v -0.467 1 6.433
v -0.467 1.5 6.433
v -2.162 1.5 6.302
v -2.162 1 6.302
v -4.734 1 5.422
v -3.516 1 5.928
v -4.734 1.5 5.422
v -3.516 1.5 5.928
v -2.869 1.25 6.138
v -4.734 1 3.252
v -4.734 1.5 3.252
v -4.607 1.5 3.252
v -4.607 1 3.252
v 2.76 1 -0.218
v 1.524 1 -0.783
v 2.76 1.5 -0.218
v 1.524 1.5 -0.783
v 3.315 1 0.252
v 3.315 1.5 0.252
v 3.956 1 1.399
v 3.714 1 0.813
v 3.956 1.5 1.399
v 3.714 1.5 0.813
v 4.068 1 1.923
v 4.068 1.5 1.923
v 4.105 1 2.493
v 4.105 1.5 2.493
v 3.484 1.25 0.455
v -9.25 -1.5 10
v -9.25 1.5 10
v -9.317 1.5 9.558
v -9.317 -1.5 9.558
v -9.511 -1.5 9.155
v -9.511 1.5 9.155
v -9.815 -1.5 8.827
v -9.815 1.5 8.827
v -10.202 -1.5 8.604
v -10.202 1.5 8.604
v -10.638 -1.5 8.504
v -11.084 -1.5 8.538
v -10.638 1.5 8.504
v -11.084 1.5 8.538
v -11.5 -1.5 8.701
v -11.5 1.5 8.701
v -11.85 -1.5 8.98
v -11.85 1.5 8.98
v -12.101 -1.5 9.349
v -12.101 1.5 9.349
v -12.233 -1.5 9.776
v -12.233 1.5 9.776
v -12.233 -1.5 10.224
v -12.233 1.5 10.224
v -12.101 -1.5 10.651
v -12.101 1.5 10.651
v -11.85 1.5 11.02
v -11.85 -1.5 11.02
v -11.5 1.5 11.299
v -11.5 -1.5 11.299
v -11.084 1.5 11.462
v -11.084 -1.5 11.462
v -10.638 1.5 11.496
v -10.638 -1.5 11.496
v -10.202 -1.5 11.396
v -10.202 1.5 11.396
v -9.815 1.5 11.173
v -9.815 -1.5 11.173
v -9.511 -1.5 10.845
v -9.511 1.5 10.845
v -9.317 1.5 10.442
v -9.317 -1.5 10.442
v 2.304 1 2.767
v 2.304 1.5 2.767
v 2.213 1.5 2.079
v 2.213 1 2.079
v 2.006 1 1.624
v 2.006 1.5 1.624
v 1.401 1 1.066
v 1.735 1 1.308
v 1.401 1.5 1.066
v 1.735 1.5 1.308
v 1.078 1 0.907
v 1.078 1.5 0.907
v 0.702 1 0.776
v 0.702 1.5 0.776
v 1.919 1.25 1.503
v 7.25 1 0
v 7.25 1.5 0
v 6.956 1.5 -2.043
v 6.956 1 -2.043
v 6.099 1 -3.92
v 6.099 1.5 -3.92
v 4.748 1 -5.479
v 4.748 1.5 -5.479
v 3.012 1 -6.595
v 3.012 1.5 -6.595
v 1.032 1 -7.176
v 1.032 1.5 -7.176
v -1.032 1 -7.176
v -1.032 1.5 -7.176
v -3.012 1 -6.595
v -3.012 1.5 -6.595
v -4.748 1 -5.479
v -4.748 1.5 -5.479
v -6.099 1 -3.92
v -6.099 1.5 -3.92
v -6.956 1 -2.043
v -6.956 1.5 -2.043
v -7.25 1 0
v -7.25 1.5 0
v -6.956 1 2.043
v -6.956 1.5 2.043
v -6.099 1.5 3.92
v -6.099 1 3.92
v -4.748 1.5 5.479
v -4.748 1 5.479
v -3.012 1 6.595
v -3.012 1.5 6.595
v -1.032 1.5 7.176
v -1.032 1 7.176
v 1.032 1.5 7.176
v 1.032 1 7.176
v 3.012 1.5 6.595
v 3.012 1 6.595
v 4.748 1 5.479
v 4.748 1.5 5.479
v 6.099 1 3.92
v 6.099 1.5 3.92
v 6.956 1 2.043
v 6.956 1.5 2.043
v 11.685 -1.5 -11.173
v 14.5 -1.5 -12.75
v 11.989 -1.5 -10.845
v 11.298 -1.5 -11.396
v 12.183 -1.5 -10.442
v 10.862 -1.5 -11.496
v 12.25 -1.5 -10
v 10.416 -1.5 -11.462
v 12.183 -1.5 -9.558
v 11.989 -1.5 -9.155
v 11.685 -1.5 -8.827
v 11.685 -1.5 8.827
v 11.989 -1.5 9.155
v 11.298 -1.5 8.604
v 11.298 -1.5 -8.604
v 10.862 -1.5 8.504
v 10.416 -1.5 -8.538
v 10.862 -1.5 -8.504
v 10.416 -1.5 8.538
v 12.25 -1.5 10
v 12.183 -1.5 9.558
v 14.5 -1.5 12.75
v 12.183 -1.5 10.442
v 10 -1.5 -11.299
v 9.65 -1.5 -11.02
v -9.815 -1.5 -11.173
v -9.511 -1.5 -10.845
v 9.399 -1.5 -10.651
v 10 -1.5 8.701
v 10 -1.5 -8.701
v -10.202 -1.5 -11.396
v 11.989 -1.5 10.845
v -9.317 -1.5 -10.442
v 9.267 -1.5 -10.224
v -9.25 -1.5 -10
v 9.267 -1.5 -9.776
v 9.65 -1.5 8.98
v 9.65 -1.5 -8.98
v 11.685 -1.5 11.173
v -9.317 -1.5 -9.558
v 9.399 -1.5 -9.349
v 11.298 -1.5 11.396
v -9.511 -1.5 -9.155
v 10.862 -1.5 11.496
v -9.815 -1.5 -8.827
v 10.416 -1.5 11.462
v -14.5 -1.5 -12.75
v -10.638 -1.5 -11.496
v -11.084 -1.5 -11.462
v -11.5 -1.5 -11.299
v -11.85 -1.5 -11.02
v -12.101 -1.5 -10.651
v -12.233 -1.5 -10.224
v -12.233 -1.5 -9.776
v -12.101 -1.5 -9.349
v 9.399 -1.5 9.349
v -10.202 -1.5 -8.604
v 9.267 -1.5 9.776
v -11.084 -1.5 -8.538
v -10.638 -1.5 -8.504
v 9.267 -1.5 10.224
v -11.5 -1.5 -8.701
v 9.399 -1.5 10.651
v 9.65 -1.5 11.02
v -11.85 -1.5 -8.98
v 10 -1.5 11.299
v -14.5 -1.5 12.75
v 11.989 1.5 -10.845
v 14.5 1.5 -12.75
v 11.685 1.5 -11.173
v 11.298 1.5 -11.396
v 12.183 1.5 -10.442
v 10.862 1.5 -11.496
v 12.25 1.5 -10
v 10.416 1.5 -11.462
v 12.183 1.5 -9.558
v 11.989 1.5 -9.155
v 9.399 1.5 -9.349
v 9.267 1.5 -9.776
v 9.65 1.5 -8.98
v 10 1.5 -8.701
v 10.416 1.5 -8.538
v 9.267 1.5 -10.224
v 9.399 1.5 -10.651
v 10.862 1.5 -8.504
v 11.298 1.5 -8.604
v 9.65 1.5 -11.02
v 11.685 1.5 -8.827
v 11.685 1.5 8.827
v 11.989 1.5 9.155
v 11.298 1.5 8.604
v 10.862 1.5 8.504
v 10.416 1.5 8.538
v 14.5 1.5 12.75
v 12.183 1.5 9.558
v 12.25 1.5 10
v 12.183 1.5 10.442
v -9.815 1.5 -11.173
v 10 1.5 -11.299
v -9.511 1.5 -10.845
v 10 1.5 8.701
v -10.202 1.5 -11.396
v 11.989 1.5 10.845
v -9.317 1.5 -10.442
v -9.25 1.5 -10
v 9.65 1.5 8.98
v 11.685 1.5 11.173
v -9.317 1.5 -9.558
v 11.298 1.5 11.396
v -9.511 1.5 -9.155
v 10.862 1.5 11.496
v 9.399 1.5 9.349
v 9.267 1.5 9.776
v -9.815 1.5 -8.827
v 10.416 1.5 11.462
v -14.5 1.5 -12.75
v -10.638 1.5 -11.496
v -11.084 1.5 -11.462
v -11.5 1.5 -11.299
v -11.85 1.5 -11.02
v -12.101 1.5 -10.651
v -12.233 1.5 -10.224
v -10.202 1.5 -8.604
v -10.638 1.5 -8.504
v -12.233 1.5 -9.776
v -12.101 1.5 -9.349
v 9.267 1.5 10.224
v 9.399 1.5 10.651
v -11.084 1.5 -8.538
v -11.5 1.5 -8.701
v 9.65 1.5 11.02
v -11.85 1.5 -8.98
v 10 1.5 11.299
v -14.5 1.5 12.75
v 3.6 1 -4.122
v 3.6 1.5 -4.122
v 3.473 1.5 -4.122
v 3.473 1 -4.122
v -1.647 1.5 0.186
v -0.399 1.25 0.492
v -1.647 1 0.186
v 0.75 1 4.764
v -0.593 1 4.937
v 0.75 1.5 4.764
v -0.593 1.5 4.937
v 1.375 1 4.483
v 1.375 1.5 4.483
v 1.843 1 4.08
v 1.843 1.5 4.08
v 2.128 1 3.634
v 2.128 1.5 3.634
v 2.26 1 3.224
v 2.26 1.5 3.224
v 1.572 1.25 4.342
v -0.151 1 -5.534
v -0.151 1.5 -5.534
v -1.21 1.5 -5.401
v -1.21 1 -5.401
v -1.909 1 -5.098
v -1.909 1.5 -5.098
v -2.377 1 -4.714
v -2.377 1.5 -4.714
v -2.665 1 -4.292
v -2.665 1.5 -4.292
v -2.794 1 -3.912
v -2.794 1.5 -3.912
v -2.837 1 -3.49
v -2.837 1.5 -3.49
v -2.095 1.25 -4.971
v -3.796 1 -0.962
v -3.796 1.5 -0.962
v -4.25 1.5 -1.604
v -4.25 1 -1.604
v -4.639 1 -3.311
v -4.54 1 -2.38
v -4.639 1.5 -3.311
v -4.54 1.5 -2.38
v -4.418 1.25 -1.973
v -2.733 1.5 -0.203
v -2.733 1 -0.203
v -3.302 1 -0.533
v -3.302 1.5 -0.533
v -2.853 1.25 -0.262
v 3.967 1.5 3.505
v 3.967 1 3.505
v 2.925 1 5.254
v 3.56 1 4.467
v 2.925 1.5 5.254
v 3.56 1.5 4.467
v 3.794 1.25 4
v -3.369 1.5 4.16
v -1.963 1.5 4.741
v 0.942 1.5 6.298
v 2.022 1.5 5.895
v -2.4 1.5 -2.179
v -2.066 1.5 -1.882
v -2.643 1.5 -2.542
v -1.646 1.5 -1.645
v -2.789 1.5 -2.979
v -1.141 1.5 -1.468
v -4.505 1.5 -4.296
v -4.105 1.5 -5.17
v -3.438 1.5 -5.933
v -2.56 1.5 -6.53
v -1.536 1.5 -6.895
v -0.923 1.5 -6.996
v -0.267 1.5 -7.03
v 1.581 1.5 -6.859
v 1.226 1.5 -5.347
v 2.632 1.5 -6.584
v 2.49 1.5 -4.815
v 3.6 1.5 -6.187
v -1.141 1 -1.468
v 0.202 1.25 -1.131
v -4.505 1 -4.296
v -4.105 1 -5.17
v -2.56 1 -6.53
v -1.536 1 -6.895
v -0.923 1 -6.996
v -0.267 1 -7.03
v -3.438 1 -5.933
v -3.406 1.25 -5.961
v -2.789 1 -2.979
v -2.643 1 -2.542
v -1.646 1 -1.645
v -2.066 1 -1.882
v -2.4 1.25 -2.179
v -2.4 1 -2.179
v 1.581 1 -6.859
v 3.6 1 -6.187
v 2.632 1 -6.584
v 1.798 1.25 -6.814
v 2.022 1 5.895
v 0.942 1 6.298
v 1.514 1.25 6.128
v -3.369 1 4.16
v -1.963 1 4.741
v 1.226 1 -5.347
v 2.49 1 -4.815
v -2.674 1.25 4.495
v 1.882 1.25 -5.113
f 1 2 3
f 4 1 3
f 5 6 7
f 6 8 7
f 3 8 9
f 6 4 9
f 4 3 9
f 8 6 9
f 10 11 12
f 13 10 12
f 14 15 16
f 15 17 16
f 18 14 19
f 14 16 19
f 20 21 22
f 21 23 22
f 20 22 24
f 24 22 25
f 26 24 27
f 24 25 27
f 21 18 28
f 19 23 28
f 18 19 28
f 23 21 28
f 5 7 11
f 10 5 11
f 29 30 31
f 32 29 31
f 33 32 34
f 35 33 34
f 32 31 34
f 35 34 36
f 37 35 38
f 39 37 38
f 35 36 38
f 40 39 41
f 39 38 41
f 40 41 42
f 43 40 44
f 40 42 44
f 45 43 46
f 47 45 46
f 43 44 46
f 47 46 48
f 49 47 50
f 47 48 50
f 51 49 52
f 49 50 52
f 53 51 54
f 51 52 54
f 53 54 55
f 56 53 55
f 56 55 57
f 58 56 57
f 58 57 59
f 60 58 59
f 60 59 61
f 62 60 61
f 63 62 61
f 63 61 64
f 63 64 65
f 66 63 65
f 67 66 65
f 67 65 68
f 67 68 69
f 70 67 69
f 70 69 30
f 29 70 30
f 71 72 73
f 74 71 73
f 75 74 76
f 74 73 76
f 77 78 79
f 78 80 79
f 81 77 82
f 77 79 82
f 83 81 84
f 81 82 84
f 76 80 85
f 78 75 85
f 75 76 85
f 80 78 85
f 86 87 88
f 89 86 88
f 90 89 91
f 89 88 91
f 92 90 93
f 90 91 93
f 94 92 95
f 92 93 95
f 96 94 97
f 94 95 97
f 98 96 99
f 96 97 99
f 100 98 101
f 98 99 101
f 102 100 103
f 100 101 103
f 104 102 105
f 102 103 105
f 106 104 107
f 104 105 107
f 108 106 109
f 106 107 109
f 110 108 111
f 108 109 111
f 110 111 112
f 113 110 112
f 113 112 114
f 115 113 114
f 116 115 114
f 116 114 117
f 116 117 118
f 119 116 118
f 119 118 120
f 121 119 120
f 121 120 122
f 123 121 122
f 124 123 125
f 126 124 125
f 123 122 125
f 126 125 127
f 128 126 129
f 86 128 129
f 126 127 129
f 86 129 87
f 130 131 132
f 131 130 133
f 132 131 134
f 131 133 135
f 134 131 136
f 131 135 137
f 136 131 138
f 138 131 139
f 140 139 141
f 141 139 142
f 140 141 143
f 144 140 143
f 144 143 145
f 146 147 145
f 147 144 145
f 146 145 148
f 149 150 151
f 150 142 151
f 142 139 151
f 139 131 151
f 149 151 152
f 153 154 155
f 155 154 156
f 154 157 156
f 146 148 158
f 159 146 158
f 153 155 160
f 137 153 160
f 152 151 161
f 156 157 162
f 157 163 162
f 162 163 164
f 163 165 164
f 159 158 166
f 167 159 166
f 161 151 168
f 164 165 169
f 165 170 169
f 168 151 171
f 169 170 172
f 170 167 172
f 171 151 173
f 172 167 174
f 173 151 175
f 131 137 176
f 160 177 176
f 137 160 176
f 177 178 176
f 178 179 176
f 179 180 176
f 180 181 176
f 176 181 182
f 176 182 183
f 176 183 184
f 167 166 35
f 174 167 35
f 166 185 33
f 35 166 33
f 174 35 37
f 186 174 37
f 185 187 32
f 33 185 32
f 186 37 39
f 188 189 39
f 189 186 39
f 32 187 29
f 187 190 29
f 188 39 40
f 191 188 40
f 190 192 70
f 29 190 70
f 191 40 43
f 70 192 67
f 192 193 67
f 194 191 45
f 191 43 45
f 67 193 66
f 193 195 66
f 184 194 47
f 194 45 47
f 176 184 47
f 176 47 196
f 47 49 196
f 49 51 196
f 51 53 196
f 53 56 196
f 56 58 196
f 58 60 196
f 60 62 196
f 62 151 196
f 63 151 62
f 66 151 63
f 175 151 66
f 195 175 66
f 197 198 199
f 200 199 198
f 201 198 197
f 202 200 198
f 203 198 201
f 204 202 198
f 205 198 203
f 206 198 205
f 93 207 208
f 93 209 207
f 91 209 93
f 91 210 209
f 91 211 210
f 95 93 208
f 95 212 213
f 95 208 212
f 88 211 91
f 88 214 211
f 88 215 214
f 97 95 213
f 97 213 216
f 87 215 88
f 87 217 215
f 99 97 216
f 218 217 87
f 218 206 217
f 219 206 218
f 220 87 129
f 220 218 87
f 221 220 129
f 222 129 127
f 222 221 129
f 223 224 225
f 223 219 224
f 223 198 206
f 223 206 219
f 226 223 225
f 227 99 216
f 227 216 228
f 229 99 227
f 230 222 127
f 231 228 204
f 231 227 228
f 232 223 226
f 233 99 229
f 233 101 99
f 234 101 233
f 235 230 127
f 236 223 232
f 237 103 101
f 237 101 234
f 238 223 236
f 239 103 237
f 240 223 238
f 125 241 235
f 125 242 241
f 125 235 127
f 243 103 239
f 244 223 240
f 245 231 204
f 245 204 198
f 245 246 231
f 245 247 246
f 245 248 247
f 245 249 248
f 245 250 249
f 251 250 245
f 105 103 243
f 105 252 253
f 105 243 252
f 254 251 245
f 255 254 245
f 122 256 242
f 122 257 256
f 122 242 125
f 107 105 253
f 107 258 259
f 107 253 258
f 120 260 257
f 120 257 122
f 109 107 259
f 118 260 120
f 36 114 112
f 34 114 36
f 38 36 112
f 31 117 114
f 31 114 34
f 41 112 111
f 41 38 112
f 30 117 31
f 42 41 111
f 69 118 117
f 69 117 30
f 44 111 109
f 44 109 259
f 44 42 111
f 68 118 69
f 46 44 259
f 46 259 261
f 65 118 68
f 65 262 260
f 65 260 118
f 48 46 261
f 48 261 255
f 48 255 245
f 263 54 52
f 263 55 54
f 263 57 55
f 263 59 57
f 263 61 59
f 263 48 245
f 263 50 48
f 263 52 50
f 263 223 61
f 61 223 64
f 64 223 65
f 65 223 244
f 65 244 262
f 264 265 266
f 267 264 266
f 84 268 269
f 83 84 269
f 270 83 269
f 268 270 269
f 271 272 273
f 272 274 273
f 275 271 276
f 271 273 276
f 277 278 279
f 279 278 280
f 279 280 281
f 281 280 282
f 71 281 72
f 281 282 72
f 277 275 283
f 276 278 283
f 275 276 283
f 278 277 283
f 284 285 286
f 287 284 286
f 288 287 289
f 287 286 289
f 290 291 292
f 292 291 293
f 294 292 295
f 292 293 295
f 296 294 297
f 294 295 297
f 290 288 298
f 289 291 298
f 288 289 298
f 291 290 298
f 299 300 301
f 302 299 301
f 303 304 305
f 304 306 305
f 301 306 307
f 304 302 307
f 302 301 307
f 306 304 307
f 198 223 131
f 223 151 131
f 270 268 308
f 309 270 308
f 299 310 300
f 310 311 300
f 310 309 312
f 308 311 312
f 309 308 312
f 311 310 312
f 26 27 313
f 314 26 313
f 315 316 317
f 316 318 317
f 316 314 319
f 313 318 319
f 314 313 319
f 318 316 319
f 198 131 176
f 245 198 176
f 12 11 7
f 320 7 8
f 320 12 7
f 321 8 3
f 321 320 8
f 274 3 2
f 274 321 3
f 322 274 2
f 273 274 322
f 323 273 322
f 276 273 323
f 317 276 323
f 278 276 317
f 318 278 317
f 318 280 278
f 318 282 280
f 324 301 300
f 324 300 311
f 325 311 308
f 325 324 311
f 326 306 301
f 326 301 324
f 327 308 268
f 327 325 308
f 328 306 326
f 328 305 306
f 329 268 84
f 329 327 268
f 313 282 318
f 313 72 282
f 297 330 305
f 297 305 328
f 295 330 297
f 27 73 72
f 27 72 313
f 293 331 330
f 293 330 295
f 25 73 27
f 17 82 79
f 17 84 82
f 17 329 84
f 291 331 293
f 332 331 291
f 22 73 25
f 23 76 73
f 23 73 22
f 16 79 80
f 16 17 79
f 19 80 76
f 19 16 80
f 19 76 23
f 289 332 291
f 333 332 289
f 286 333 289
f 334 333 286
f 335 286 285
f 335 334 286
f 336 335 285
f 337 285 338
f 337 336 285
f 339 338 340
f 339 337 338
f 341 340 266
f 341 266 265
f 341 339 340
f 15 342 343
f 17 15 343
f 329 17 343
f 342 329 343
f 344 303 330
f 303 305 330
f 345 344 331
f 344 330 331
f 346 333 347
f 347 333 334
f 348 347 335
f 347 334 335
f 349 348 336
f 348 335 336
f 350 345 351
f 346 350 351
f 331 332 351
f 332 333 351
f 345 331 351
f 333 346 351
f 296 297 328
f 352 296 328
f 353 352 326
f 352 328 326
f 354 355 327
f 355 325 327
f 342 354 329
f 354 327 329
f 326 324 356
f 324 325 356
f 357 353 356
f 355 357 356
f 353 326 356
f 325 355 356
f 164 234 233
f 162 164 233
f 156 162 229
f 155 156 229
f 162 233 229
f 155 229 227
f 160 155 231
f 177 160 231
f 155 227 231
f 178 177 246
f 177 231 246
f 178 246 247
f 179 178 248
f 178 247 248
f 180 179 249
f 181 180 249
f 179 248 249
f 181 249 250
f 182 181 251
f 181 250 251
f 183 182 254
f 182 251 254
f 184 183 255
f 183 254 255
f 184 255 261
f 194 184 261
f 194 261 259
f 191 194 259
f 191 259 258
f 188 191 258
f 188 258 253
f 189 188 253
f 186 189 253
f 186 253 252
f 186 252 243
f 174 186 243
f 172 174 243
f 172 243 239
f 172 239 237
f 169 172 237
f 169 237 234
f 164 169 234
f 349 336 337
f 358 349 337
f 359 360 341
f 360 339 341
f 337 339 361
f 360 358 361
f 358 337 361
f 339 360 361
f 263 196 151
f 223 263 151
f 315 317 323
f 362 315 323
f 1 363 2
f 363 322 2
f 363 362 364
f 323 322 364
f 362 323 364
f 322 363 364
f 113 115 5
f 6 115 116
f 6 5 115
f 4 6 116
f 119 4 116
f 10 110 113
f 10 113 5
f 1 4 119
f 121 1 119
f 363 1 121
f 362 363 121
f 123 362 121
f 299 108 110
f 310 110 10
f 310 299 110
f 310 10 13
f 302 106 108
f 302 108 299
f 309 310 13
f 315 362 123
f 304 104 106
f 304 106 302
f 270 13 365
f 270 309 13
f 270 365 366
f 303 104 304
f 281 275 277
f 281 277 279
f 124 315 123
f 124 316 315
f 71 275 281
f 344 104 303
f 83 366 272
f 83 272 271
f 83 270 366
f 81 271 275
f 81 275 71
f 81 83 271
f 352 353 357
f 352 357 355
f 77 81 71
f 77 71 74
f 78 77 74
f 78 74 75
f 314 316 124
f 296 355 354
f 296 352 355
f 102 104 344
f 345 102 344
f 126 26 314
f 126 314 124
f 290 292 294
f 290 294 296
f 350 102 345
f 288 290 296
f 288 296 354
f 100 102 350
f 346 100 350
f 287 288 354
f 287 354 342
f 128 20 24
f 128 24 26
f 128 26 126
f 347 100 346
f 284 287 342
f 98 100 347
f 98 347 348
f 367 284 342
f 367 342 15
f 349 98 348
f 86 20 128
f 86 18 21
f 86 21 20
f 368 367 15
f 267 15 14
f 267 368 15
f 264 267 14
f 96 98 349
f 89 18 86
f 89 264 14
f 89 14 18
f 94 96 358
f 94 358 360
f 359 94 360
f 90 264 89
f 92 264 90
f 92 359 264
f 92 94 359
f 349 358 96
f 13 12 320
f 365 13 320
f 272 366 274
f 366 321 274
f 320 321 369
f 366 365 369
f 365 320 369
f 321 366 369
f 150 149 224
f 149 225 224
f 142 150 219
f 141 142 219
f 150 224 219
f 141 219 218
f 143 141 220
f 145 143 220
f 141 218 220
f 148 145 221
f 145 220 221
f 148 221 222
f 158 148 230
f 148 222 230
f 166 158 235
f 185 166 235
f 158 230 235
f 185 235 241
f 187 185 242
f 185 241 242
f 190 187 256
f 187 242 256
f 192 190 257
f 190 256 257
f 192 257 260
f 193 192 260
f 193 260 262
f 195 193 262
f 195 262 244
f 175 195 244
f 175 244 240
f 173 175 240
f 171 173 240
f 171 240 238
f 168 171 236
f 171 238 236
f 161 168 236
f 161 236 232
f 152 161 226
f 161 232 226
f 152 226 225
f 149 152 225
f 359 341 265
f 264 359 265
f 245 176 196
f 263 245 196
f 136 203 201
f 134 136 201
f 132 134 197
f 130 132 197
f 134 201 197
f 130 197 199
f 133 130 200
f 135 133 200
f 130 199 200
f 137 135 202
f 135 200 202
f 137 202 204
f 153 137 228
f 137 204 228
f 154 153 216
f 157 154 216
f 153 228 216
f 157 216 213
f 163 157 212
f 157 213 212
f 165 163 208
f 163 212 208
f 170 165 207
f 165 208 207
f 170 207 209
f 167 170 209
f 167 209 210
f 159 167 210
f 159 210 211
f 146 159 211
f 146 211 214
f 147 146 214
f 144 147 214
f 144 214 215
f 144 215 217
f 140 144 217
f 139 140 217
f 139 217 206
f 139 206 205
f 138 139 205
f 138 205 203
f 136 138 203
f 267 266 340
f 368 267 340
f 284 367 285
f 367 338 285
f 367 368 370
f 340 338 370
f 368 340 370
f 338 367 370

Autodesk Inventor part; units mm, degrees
ref_plane "YZ Plane" through (0, 0, 0) normal (1, 0, 0) x (0, 1, 0)
ref_plane "XZ Plane" through (0, 0, 0) normal (0, 1, 0) x (-1, 0, 0)
ref_plane "XY Plane" through (0, 0, 0) normal (0, 0, 1) x (1, 0, 0)
sketch "Sketch1" plane through (0, 0, 0) normal (0, 1, 0) x (-1, 0, 0)
  line L0 (14.5, 12.75) -> (-14.5, 12.75)
  line L1 (-14.5, 12.75) -> (-14.5, -12.75)
  line L2 (-14.5, -12.75) -> (14.5, -12.75)
  line L3 (14.5, -12.75) -> (14.5, 12.75)
  line L4 (14.5, 12.75) -> (-14.5, -12.75) construction
  line L5 (-14.5, 12.75) -> (14.5, -12.75) construction
  point P0 (0, 0)
  dimension "d0" = 29
  dimension "d1" = 25.5
extrude "Extrusion1" add sketch "Sketch1" along normal mid plane 3
sketch "Sketch2" plane through (0, 1.5, 0) normal (0, 1, 0) x (1, 0, 0)
  circle A0 centre (-10.75, 10) radius 1.5
  line L0 (14.5, 12.75) -> (-14.5, 12.75) projected
  line L1 (-14.5, 12.75) -> (-14.5, -12.75) projected
  circle A1 centre (10.75, 10) radius 1.5
  circle A2 centre (-10.75, -10) radius 1.5
  circle A3 centre (10.75, -10) radius 1.5
  point P0 (0, 0)
  dimension "d4" = 3
  dimension "d5" = 2.75
  dimension "d6" = 3.75
  dimension "d9" = 21.5
  dimension "d12" = 20
sketch "Sketch3" plane through (0, 1.5, 0) normal (0, 1, 0) x (1, 0, 0)
  circle A0 centre (0, 0) radius 7.25
  dimension "d15" = 14.5
extrude "Extrusion2" cut sketch "Sketch2" against normal through all
sketch "Sketch4" plane through (0, 1.5, 0) normal (0, 1, 0) x (1, 0, 0)
  line L0 (-5.4078, 7.0301) -> (8.8628, 7.0301) construction
  line L1 (8.8628, 7.0301) -> (8.8628, -8.322) construction
  line L2 (8.8628, -8.322) -> (-5.4078, -8.322) construction
  line L3 (-5.4078, -8.322) -> (-5.4078, 7.0301) construction
  spline S0 degree 2 poles (-0.467, -6.4334) (-1.8786, -6.4334) (-3.8592, -5.8434) (-4.7336, -5.4221) knots 0 0 0 1 2 2 2
  line L4 (-4.7336, -5.4221) -> (-4.7336, -3.2519)
  line L5 (-4.7336, -3.2519) -> (-4.6072, -3.2519)
  spline S1 degree 2 poles (-4.6072, -3.2519) (-3.7538, -4.0525) (-1.5942, -4.9374) (-0.5934, -4.9374) knots 0 0 0 1 2 2 2
  spline S2 degree 2 poles (-0.5934, -4.9374) (0.8394, -4.9374) (2.3037, -3.747) (2.3037, -2.7673) knots 0 0 0 1 2 2 2
  spline S3 degree 2 poles (2.3037, -2.7673) (2.3037, -1.9877) (1.5347, -1.0185) (0.7024, -0.7762) knots 0 0 0 1 2 2 2
  spline S4 degree 2 poles (0.7024, -0.7762) (0.1019, -0.6076) (-0.8989, -0.3759) (-1.6469, -0.1862) knots 0 0 0 1 2 2 2
  spline S5 degree 2 poles (-1.6469, -0.1862) (-2.3211, -0.0071) (-3.3851, 0.5301) (-3.796, 0.9621) knots 0 0 0 1 2 2 2
  spline S6 degree 2 poles (-3.796, 0.9621) (-4.1963, 1.394) (-4.6388, 2.5528) (-4.6388, 3.3113) knots 0 0 0 1 2 2 2
  spline S7 degree 2 poles (-4.6388, 3.3113) (-4.6388, 4.8916) (-2.1736, 7.0301) (-0.2668, 7.0301) knots 0 0 0 1 2 2 2
  spline S8 degree 2 poles (-0.2668, 7.0301) (0.8288, 7.0301) (2.7672, 6.5982) (3.5995, 6.1873) knots 0 0 0 1 2 2 2
  line L6 (3.5995, 6.1873) -> (3.5995, 4.1225)
  line L7 (3.5995, 4.1225) -> (3.4731, 4.1225)
  spline S9 degree 2 poles (3.4731, 4.1225) (2.8515, 4.6914) (0.9131, 5.5342) (-0.1509, 5.5342) knots 0 0 0 1 2 2 2
  spline S10 degree 2 poles (-0.1509, 5.5342) (-1.3519, 5.5342) (-2.8373, 4.407) (-2.8373, 3.4904) knots 0 0 0 1 2 2 2
  spline S11 degree 2 poles (-2.8373, 3.4904) (-2.8373, 2.6687) (-1.9629, 1.689) (-1.1412, 1.4677) knots 0 0 0 1 2 2 2
  spline S12 degree 2 poles (-1.1412, 1.4677) (-0.5934, 1.3203) (0.9974, 0.941) (1.5241, 0.783) knots 0 0 0 1 2 2 2
  spline S13 degree 2 poles (1.5241, 0.783) (2.8621, 0.3721) (4.1052, -1.2819) (4.1052, -2.4934) knots 0 0 0 1 2 2 2
  spline S14 degree 2 poles (4.1052, -2.4934) (4.1052, -3.2624) (3.4836, -4.7373) (2.9253, -5.2535) knots 0 0 0 1 2 2 2
  spline S15 degree 2 poles (2.9253, -5.2535) (2.3037, -5.8224) (0.7235, -6.4334) (-0.467, -6.4334) knots 0 0 0 1 2 2 2
  point P0 (0, 0)
extrude "Extrusion3" cut sketch "Sketch3" against normal blind 0.5
extrude "Extrusion4" add sketch "Sketch4" against normal blind 0.5
properties material "Iron, Cast"
